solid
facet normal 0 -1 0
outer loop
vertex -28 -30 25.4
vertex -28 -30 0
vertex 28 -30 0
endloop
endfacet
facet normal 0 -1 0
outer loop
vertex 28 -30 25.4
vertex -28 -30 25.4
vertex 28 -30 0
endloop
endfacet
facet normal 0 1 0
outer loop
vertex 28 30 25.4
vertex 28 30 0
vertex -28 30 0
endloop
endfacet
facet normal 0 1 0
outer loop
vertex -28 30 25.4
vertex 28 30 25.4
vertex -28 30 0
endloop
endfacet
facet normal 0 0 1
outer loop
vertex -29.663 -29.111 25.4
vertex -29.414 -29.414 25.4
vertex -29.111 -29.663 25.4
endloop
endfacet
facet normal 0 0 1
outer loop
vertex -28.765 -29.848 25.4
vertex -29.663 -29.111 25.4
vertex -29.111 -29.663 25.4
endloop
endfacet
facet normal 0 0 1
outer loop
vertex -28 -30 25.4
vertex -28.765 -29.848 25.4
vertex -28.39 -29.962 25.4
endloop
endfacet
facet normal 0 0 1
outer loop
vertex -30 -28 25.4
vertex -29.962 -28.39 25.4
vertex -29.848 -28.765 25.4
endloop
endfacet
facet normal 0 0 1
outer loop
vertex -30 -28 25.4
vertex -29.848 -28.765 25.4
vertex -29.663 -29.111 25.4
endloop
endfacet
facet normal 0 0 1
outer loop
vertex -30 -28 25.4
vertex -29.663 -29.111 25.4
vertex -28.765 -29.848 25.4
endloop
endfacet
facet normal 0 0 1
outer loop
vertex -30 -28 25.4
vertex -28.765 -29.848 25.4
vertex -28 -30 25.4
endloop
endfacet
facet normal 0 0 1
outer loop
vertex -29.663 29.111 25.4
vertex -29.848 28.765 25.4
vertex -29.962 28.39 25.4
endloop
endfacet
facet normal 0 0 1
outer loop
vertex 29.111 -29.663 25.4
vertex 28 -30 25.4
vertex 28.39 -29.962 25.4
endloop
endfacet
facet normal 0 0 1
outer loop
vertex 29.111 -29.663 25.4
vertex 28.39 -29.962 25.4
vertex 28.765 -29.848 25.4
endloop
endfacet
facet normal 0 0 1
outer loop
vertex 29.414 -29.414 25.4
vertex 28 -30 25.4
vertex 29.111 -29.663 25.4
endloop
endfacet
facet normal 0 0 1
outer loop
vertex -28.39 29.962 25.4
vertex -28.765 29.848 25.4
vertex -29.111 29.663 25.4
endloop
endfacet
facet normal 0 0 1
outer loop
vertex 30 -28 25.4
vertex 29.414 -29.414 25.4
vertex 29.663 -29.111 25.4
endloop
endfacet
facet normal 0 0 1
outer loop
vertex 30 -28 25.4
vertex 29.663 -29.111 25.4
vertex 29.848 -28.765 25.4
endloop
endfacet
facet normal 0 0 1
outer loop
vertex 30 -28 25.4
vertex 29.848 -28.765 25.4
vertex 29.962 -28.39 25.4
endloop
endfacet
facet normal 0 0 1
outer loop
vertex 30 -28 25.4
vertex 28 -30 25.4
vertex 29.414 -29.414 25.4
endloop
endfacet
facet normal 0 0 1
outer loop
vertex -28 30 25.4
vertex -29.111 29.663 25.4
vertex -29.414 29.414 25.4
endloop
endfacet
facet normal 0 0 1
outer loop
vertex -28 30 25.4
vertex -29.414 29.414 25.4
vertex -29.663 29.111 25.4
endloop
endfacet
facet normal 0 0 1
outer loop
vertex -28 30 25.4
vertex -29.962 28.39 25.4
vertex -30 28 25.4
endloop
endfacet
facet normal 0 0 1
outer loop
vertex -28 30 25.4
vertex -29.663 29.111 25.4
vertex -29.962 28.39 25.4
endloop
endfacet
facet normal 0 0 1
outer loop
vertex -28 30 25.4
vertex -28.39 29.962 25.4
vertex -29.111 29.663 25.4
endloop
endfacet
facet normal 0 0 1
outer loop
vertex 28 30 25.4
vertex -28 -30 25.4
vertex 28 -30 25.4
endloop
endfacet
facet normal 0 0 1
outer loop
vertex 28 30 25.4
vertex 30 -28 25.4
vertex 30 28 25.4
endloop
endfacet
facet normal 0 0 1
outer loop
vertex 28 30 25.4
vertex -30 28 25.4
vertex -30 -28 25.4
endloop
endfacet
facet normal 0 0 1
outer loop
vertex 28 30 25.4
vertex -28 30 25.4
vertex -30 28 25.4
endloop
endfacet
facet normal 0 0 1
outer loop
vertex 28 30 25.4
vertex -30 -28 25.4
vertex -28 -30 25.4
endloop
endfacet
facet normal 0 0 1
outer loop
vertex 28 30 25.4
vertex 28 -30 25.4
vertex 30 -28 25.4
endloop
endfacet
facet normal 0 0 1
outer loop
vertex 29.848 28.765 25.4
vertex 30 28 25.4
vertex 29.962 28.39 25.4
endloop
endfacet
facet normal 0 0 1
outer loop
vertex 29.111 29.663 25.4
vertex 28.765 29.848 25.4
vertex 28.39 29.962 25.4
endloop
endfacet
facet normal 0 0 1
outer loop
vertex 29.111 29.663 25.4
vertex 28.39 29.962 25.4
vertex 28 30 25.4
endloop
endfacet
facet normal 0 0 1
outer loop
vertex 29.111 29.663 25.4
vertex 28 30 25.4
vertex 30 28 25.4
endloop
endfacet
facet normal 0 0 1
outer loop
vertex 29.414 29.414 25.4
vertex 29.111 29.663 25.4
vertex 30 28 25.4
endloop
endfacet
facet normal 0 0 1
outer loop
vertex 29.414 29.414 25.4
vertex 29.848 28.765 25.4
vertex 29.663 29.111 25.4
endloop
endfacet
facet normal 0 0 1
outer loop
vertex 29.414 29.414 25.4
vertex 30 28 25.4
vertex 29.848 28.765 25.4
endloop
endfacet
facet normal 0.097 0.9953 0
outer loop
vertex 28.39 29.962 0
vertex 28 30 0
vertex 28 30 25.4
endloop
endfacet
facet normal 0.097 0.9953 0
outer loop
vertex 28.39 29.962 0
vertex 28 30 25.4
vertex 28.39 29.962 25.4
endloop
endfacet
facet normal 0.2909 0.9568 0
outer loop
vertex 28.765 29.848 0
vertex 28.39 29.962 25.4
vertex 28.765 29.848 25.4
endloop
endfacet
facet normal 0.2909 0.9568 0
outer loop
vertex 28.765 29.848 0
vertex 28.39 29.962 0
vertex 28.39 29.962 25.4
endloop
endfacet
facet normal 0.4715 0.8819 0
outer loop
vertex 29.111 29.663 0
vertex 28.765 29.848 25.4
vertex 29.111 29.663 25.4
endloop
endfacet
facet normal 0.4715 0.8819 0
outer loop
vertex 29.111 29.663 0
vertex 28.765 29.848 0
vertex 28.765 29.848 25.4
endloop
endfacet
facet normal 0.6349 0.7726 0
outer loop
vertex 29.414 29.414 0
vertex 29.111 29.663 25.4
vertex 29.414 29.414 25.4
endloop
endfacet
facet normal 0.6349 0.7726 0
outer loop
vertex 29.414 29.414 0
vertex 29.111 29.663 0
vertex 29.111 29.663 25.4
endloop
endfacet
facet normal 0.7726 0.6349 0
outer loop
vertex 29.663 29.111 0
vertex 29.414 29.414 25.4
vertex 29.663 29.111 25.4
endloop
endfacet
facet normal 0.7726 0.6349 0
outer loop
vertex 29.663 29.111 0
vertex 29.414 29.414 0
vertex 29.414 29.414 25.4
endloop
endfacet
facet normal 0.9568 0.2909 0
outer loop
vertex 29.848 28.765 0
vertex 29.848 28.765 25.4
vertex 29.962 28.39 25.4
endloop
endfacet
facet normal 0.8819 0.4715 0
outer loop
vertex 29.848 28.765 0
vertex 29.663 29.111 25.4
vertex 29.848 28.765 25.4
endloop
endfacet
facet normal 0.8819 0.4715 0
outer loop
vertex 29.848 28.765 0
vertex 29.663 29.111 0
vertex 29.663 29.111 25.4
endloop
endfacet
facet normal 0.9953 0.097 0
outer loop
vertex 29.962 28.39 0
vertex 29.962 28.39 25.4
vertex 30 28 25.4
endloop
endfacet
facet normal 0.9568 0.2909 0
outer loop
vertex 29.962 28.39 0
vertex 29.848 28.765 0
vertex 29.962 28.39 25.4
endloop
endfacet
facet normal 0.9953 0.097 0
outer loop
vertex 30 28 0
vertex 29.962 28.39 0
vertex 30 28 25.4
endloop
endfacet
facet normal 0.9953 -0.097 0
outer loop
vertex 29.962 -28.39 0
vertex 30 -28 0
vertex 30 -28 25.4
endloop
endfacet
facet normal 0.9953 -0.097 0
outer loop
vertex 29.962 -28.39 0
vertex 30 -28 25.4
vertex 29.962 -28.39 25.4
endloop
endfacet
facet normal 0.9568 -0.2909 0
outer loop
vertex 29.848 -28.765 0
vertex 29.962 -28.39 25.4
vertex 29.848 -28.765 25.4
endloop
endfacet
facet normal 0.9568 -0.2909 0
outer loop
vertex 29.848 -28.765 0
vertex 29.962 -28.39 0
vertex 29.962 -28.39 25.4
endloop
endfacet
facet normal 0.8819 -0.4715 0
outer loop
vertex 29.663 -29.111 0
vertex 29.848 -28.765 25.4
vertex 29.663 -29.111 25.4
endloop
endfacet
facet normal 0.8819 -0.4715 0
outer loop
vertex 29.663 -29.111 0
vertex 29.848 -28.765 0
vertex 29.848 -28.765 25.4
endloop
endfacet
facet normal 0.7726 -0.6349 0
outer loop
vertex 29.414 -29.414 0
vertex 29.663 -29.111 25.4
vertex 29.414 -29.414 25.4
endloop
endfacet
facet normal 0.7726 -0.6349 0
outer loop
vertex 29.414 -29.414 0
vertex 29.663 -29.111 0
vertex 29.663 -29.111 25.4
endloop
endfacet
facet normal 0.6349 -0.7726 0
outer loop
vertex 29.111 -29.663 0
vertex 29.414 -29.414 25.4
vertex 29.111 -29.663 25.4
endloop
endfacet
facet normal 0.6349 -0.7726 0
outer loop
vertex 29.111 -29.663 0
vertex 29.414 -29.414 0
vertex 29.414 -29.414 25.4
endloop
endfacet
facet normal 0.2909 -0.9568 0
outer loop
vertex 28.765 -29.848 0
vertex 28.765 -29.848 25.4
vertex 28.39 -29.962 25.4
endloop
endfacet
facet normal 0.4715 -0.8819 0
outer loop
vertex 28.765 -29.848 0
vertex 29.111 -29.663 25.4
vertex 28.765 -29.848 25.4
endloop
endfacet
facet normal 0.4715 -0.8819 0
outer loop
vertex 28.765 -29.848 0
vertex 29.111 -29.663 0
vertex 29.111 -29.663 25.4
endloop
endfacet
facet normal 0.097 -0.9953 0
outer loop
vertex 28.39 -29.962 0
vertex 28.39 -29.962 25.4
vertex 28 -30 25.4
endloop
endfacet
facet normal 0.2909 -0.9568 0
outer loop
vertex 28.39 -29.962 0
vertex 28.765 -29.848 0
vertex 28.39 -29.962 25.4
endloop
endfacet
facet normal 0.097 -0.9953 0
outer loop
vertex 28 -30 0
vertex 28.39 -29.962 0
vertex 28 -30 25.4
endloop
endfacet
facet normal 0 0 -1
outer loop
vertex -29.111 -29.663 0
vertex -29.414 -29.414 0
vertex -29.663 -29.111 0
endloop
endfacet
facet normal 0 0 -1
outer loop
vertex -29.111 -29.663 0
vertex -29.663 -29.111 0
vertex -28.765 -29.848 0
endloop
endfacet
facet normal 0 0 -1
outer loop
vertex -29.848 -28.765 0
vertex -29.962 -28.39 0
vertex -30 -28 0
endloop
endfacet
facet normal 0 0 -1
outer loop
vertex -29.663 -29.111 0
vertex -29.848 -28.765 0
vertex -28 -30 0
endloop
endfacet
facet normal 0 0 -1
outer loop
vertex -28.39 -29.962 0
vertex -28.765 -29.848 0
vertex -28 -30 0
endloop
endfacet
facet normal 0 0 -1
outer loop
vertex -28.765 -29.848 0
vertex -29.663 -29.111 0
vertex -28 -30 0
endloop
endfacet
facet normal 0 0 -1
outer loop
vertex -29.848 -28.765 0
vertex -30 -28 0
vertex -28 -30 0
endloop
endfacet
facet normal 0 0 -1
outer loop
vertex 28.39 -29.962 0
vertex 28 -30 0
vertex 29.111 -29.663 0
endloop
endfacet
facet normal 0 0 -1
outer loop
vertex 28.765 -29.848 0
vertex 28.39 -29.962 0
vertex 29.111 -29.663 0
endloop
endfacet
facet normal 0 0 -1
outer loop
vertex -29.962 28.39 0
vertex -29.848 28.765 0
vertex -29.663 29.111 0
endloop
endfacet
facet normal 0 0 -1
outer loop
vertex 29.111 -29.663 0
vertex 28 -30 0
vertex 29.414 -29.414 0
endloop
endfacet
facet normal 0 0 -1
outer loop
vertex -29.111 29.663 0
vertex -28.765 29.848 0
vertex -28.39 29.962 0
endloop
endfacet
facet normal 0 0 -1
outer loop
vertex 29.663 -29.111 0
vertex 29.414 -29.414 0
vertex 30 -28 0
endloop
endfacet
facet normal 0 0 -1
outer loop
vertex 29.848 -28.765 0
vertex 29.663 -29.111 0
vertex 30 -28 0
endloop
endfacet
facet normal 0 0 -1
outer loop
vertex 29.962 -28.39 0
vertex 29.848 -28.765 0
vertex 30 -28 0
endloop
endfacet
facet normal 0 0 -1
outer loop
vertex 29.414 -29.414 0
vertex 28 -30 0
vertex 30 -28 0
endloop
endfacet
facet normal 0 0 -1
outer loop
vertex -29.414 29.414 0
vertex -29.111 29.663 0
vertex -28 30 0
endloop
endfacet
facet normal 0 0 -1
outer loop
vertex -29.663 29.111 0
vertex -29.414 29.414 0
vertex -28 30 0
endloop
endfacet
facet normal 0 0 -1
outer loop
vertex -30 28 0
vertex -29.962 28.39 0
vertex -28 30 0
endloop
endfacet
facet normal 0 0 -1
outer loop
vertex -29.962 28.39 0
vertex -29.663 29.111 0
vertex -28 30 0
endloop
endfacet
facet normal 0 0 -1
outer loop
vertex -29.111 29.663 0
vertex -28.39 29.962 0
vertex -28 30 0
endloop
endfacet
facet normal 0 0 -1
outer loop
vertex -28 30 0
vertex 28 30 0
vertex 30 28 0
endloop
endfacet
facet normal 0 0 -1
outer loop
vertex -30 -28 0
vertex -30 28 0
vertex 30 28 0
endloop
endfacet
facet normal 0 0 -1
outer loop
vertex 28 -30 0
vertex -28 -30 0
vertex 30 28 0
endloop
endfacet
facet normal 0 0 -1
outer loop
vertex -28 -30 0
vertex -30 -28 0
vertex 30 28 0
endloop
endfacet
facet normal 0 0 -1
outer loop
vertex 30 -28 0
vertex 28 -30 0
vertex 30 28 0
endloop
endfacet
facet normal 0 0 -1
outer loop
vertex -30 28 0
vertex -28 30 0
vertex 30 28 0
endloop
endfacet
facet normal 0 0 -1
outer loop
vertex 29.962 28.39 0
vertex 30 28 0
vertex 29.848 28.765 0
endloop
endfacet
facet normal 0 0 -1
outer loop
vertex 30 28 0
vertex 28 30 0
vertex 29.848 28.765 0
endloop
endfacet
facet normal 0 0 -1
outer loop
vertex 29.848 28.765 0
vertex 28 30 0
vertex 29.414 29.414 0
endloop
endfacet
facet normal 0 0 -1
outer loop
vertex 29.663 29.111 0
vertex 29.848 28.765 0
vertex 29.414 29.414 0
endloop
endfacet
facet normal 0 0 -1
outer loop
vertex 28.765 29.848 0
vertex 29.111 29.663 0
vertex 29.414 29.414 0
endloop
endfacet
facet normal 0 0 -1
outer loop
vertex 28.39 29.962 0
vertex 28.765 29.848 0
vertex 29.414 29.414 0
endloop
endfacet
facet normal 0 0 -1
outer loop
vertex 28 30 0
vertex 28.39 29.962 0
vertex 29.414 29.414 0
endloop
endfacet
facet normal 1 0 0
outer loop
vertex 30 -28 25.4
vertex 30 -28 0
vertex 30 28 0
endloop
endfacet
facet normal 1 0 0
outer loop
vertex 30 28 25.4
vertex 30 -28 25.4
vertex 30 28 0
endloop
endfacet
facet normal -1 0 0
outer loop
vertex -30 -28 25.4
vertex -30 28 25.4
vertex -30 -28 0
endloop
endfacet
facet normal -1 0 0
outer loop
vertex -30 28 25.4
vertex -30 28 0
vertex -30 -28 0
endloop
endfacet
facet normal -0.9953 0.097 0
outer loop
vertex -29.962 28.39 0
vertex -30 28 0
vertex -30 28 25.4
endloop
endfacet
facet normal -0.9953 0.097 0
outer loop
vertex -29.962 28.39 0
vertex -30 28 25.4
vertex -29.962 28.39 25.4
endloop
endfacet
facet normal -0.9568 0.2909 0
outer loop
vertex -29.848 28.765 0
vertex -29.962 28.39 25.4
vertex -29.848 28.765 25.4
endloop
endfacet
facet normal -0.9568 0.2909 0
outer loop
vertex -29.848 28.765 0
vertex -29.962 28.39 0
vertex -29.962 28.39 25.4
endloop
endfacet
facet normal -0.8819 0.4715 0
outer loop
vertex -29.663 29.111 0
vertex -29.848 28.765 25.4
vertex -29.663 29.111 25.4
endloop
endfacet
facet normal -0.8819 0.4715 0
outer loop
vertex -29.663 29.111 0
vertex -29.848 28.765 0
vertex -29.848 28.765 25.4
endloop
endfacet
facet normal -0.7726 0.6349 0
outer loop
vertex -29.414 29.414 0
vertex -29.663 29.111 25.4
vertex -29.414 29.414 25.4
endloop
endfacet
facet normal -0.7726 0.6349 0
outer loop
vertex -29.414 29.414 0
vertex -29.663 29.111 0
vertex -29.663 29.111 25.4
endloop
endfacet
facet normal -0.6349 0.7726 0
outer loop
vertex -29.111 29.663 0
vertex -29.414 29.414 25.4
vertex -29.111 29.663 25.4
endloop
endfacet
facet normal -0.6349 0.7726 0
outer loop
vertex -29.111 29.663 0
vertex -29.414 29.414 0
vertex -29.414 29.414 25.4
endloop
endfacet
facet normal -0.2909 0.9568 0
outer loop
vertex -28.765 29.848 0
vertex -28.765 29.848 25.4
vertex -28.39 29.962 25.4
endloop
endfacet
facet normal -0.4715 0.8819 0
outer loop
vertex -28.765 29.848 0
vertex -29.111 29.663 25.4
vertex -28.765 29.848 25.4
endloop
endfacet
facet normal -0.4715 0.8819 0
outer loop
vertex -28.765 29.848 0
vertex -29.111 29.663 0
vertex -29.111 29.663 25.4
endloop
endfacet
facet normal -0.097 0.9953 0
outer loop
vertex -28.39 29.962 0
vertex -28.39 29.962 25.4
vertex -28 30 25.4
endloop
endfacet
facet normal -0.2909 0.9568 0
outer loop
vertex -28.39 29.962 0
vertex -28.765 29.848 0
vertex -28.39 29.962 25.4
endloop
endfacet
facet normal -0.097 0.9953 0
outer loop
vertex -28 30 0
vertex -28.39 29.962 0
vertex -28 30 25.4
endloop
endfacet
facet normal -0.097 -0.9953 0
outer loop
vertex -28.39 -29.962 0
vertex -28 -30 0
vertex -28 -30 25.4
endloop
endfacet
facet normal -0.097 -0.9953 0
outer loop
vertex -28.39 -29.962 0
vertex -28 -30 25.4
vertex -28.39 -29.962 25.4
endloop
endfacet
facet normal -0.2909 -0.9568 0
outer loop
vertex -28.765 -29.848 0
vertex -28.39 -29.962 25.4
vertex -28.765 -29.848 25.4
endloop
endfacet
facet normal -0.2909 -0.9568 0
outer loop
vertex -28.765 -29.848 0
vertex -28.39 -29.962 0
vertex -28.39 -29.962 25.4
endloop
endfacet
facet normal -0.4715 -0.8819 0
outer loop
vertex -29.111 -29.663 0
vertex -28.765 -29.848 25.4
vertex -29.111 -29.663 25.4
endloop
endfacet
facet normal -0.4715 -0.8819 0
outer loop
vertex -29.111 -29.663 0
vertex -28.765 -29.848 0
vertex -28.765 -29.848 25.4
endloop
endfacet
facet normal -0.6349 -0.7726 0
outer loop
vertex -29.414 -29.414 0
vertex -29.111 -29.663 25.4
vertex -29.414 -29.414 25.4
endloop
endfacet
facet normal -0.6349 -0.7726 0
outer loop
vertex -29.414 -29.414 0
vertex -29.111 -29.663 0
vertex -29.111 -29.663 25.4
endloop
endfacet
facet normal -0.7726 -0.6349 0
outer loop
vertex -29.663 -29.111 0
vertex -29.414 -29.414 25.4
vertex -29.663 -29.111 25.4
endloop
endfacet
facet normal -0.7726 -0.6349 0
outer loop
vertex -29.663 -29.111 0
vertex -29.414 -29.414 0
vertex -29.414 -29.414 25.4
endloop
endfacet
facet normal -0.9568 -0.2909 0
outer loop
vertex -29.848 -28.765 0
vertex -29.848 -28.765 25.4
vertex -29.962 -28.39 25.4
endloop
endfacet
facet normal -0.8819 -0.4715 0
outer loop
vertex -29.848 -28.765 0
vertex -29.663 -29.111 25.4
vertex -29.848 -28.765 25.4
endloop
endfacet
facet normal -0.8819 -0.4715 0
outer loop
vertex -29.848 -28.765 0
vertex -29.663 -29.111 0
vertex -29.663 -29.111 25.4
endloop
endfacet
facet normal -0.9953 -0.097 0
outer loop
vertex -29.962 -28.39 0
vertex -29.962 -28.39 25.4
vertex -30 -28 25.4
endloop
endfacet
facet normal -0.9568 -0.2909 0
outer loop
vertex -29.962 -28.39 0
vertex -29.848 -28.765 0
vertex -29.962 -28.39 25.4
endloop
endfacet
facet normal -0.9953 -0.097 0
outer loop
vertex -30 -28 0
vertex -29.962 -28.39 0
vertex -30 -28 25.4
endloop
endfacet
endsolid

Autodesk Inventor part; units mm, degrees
ref_plane "YZ Plane" through (0, 0, 0) normal (1, 0, 0) x (0, 1, 0)
ref_plane "XZ Plane" through (0, 0, 0) normal (0, 1, 0) x (-1, 0, 0)
ref_plane "XY Plane" through (0, 0, 0) normal (0, 0, 1) x (1, 0, 0)
sketch "Sketch3" plane through (0, 0, 0) normal (0, 0, -1) x (-1, 0, 0)
  line L0 (28, -30) -> (-28, -30)
  line L1 (-30, -28) -> (-30, 28)
  line L2 (-28, 30) -> (28, 30)
  line L3 (30, 28) -> (30, -28)
  circle A0 centre (0, 0) radius 23.5
  arc A1 (28, -30) -> (30, -28) centre (28, -28) ccw
  arc A2 (30, 28) -> (28, 30) centre (28, 28) ccw
  arc A3 (-30, -28) -> (-28, -30) centre (-28, -28) ccw
  arc A4 (-28, 30) -> (-30, 28) centre (-28, 28) ccw
  line L4 (0, -58.6799) -> (0, 58.6799)
  line L5 (58.6799, 0) -> (-58.6799, 0)
  point P0 (30, -30)
  point P1 (-30, -30)
  point P2 (30, 30)
  point P3 (26.5, 15)
  point P4 (26.5, 15)
  point P5 (22.4506, 22.4506)
  point P6 (-22.4506, 22.4506)
  point P7 (-22.4506, -22.4506)
  point P8 (22.4506, -22.4506)
  point P9 (15, 26.5)
  point P10 (-15, 26.5)
  point P11 (-26.5, -15)
  point P12 (15, -26.5)
  point P13 (-26.5, 15)
  point P14 (-15, -26.5)
  point P15 (26.5, -15)
sketch "Sketch2" plane through (0, 0, 0) normal (0, 0, 1) x (1, 0, 0)
  line L0 (28, 30) -> (-28, 30) projected
  arc A0 (-28, 30) -> (-30, 28) centre (-28, 28) ccw projected
  line L1 (-30, 28) -> (-30, -28) projected
  line L2 (30, -28) -> (30, 28) projected
  arc A1 (30, 28) -> (28, 30) centre (28, 28) ccw projected
  arc A2 (28, -30) -> (30, -28) centre (28, -28) ccw projected
  line L3 (-28, -30) -> (28, -30) projected
  arc A3 (-30, -28) -> (-28, -30) centre (-28, -28) ccw projected
  line L4 (-30, 30) -> (30, 30)
  line L5 (30, 30) -> (30, -30)
  line L6 (30, -30) -> (-30, -30)
  line L7 (-30, -30) -> (-30, 30)
  point P0 (0, 0)
  point P1 (-26.5, 15)
  point P2 (-22.4506, 22.4506)
  point P3 (-15, 26.5)
  point P4 (15, 26.5)
  point P5 (-26.5, -15)
  point P6 (-22.4506, -22.4506)
  point P7 (-15, -26.5)
  point P8 (15, -26.5)
  point P9 (22.4506, -22.4506)
  point P10 (26.5, -15)
extrude "Extrusion2" add sketch "Sketch2" along normal blind 25.4 contours A1 L2 A2 L3 A3 L1 A0 L0
properties part number "Glass"
